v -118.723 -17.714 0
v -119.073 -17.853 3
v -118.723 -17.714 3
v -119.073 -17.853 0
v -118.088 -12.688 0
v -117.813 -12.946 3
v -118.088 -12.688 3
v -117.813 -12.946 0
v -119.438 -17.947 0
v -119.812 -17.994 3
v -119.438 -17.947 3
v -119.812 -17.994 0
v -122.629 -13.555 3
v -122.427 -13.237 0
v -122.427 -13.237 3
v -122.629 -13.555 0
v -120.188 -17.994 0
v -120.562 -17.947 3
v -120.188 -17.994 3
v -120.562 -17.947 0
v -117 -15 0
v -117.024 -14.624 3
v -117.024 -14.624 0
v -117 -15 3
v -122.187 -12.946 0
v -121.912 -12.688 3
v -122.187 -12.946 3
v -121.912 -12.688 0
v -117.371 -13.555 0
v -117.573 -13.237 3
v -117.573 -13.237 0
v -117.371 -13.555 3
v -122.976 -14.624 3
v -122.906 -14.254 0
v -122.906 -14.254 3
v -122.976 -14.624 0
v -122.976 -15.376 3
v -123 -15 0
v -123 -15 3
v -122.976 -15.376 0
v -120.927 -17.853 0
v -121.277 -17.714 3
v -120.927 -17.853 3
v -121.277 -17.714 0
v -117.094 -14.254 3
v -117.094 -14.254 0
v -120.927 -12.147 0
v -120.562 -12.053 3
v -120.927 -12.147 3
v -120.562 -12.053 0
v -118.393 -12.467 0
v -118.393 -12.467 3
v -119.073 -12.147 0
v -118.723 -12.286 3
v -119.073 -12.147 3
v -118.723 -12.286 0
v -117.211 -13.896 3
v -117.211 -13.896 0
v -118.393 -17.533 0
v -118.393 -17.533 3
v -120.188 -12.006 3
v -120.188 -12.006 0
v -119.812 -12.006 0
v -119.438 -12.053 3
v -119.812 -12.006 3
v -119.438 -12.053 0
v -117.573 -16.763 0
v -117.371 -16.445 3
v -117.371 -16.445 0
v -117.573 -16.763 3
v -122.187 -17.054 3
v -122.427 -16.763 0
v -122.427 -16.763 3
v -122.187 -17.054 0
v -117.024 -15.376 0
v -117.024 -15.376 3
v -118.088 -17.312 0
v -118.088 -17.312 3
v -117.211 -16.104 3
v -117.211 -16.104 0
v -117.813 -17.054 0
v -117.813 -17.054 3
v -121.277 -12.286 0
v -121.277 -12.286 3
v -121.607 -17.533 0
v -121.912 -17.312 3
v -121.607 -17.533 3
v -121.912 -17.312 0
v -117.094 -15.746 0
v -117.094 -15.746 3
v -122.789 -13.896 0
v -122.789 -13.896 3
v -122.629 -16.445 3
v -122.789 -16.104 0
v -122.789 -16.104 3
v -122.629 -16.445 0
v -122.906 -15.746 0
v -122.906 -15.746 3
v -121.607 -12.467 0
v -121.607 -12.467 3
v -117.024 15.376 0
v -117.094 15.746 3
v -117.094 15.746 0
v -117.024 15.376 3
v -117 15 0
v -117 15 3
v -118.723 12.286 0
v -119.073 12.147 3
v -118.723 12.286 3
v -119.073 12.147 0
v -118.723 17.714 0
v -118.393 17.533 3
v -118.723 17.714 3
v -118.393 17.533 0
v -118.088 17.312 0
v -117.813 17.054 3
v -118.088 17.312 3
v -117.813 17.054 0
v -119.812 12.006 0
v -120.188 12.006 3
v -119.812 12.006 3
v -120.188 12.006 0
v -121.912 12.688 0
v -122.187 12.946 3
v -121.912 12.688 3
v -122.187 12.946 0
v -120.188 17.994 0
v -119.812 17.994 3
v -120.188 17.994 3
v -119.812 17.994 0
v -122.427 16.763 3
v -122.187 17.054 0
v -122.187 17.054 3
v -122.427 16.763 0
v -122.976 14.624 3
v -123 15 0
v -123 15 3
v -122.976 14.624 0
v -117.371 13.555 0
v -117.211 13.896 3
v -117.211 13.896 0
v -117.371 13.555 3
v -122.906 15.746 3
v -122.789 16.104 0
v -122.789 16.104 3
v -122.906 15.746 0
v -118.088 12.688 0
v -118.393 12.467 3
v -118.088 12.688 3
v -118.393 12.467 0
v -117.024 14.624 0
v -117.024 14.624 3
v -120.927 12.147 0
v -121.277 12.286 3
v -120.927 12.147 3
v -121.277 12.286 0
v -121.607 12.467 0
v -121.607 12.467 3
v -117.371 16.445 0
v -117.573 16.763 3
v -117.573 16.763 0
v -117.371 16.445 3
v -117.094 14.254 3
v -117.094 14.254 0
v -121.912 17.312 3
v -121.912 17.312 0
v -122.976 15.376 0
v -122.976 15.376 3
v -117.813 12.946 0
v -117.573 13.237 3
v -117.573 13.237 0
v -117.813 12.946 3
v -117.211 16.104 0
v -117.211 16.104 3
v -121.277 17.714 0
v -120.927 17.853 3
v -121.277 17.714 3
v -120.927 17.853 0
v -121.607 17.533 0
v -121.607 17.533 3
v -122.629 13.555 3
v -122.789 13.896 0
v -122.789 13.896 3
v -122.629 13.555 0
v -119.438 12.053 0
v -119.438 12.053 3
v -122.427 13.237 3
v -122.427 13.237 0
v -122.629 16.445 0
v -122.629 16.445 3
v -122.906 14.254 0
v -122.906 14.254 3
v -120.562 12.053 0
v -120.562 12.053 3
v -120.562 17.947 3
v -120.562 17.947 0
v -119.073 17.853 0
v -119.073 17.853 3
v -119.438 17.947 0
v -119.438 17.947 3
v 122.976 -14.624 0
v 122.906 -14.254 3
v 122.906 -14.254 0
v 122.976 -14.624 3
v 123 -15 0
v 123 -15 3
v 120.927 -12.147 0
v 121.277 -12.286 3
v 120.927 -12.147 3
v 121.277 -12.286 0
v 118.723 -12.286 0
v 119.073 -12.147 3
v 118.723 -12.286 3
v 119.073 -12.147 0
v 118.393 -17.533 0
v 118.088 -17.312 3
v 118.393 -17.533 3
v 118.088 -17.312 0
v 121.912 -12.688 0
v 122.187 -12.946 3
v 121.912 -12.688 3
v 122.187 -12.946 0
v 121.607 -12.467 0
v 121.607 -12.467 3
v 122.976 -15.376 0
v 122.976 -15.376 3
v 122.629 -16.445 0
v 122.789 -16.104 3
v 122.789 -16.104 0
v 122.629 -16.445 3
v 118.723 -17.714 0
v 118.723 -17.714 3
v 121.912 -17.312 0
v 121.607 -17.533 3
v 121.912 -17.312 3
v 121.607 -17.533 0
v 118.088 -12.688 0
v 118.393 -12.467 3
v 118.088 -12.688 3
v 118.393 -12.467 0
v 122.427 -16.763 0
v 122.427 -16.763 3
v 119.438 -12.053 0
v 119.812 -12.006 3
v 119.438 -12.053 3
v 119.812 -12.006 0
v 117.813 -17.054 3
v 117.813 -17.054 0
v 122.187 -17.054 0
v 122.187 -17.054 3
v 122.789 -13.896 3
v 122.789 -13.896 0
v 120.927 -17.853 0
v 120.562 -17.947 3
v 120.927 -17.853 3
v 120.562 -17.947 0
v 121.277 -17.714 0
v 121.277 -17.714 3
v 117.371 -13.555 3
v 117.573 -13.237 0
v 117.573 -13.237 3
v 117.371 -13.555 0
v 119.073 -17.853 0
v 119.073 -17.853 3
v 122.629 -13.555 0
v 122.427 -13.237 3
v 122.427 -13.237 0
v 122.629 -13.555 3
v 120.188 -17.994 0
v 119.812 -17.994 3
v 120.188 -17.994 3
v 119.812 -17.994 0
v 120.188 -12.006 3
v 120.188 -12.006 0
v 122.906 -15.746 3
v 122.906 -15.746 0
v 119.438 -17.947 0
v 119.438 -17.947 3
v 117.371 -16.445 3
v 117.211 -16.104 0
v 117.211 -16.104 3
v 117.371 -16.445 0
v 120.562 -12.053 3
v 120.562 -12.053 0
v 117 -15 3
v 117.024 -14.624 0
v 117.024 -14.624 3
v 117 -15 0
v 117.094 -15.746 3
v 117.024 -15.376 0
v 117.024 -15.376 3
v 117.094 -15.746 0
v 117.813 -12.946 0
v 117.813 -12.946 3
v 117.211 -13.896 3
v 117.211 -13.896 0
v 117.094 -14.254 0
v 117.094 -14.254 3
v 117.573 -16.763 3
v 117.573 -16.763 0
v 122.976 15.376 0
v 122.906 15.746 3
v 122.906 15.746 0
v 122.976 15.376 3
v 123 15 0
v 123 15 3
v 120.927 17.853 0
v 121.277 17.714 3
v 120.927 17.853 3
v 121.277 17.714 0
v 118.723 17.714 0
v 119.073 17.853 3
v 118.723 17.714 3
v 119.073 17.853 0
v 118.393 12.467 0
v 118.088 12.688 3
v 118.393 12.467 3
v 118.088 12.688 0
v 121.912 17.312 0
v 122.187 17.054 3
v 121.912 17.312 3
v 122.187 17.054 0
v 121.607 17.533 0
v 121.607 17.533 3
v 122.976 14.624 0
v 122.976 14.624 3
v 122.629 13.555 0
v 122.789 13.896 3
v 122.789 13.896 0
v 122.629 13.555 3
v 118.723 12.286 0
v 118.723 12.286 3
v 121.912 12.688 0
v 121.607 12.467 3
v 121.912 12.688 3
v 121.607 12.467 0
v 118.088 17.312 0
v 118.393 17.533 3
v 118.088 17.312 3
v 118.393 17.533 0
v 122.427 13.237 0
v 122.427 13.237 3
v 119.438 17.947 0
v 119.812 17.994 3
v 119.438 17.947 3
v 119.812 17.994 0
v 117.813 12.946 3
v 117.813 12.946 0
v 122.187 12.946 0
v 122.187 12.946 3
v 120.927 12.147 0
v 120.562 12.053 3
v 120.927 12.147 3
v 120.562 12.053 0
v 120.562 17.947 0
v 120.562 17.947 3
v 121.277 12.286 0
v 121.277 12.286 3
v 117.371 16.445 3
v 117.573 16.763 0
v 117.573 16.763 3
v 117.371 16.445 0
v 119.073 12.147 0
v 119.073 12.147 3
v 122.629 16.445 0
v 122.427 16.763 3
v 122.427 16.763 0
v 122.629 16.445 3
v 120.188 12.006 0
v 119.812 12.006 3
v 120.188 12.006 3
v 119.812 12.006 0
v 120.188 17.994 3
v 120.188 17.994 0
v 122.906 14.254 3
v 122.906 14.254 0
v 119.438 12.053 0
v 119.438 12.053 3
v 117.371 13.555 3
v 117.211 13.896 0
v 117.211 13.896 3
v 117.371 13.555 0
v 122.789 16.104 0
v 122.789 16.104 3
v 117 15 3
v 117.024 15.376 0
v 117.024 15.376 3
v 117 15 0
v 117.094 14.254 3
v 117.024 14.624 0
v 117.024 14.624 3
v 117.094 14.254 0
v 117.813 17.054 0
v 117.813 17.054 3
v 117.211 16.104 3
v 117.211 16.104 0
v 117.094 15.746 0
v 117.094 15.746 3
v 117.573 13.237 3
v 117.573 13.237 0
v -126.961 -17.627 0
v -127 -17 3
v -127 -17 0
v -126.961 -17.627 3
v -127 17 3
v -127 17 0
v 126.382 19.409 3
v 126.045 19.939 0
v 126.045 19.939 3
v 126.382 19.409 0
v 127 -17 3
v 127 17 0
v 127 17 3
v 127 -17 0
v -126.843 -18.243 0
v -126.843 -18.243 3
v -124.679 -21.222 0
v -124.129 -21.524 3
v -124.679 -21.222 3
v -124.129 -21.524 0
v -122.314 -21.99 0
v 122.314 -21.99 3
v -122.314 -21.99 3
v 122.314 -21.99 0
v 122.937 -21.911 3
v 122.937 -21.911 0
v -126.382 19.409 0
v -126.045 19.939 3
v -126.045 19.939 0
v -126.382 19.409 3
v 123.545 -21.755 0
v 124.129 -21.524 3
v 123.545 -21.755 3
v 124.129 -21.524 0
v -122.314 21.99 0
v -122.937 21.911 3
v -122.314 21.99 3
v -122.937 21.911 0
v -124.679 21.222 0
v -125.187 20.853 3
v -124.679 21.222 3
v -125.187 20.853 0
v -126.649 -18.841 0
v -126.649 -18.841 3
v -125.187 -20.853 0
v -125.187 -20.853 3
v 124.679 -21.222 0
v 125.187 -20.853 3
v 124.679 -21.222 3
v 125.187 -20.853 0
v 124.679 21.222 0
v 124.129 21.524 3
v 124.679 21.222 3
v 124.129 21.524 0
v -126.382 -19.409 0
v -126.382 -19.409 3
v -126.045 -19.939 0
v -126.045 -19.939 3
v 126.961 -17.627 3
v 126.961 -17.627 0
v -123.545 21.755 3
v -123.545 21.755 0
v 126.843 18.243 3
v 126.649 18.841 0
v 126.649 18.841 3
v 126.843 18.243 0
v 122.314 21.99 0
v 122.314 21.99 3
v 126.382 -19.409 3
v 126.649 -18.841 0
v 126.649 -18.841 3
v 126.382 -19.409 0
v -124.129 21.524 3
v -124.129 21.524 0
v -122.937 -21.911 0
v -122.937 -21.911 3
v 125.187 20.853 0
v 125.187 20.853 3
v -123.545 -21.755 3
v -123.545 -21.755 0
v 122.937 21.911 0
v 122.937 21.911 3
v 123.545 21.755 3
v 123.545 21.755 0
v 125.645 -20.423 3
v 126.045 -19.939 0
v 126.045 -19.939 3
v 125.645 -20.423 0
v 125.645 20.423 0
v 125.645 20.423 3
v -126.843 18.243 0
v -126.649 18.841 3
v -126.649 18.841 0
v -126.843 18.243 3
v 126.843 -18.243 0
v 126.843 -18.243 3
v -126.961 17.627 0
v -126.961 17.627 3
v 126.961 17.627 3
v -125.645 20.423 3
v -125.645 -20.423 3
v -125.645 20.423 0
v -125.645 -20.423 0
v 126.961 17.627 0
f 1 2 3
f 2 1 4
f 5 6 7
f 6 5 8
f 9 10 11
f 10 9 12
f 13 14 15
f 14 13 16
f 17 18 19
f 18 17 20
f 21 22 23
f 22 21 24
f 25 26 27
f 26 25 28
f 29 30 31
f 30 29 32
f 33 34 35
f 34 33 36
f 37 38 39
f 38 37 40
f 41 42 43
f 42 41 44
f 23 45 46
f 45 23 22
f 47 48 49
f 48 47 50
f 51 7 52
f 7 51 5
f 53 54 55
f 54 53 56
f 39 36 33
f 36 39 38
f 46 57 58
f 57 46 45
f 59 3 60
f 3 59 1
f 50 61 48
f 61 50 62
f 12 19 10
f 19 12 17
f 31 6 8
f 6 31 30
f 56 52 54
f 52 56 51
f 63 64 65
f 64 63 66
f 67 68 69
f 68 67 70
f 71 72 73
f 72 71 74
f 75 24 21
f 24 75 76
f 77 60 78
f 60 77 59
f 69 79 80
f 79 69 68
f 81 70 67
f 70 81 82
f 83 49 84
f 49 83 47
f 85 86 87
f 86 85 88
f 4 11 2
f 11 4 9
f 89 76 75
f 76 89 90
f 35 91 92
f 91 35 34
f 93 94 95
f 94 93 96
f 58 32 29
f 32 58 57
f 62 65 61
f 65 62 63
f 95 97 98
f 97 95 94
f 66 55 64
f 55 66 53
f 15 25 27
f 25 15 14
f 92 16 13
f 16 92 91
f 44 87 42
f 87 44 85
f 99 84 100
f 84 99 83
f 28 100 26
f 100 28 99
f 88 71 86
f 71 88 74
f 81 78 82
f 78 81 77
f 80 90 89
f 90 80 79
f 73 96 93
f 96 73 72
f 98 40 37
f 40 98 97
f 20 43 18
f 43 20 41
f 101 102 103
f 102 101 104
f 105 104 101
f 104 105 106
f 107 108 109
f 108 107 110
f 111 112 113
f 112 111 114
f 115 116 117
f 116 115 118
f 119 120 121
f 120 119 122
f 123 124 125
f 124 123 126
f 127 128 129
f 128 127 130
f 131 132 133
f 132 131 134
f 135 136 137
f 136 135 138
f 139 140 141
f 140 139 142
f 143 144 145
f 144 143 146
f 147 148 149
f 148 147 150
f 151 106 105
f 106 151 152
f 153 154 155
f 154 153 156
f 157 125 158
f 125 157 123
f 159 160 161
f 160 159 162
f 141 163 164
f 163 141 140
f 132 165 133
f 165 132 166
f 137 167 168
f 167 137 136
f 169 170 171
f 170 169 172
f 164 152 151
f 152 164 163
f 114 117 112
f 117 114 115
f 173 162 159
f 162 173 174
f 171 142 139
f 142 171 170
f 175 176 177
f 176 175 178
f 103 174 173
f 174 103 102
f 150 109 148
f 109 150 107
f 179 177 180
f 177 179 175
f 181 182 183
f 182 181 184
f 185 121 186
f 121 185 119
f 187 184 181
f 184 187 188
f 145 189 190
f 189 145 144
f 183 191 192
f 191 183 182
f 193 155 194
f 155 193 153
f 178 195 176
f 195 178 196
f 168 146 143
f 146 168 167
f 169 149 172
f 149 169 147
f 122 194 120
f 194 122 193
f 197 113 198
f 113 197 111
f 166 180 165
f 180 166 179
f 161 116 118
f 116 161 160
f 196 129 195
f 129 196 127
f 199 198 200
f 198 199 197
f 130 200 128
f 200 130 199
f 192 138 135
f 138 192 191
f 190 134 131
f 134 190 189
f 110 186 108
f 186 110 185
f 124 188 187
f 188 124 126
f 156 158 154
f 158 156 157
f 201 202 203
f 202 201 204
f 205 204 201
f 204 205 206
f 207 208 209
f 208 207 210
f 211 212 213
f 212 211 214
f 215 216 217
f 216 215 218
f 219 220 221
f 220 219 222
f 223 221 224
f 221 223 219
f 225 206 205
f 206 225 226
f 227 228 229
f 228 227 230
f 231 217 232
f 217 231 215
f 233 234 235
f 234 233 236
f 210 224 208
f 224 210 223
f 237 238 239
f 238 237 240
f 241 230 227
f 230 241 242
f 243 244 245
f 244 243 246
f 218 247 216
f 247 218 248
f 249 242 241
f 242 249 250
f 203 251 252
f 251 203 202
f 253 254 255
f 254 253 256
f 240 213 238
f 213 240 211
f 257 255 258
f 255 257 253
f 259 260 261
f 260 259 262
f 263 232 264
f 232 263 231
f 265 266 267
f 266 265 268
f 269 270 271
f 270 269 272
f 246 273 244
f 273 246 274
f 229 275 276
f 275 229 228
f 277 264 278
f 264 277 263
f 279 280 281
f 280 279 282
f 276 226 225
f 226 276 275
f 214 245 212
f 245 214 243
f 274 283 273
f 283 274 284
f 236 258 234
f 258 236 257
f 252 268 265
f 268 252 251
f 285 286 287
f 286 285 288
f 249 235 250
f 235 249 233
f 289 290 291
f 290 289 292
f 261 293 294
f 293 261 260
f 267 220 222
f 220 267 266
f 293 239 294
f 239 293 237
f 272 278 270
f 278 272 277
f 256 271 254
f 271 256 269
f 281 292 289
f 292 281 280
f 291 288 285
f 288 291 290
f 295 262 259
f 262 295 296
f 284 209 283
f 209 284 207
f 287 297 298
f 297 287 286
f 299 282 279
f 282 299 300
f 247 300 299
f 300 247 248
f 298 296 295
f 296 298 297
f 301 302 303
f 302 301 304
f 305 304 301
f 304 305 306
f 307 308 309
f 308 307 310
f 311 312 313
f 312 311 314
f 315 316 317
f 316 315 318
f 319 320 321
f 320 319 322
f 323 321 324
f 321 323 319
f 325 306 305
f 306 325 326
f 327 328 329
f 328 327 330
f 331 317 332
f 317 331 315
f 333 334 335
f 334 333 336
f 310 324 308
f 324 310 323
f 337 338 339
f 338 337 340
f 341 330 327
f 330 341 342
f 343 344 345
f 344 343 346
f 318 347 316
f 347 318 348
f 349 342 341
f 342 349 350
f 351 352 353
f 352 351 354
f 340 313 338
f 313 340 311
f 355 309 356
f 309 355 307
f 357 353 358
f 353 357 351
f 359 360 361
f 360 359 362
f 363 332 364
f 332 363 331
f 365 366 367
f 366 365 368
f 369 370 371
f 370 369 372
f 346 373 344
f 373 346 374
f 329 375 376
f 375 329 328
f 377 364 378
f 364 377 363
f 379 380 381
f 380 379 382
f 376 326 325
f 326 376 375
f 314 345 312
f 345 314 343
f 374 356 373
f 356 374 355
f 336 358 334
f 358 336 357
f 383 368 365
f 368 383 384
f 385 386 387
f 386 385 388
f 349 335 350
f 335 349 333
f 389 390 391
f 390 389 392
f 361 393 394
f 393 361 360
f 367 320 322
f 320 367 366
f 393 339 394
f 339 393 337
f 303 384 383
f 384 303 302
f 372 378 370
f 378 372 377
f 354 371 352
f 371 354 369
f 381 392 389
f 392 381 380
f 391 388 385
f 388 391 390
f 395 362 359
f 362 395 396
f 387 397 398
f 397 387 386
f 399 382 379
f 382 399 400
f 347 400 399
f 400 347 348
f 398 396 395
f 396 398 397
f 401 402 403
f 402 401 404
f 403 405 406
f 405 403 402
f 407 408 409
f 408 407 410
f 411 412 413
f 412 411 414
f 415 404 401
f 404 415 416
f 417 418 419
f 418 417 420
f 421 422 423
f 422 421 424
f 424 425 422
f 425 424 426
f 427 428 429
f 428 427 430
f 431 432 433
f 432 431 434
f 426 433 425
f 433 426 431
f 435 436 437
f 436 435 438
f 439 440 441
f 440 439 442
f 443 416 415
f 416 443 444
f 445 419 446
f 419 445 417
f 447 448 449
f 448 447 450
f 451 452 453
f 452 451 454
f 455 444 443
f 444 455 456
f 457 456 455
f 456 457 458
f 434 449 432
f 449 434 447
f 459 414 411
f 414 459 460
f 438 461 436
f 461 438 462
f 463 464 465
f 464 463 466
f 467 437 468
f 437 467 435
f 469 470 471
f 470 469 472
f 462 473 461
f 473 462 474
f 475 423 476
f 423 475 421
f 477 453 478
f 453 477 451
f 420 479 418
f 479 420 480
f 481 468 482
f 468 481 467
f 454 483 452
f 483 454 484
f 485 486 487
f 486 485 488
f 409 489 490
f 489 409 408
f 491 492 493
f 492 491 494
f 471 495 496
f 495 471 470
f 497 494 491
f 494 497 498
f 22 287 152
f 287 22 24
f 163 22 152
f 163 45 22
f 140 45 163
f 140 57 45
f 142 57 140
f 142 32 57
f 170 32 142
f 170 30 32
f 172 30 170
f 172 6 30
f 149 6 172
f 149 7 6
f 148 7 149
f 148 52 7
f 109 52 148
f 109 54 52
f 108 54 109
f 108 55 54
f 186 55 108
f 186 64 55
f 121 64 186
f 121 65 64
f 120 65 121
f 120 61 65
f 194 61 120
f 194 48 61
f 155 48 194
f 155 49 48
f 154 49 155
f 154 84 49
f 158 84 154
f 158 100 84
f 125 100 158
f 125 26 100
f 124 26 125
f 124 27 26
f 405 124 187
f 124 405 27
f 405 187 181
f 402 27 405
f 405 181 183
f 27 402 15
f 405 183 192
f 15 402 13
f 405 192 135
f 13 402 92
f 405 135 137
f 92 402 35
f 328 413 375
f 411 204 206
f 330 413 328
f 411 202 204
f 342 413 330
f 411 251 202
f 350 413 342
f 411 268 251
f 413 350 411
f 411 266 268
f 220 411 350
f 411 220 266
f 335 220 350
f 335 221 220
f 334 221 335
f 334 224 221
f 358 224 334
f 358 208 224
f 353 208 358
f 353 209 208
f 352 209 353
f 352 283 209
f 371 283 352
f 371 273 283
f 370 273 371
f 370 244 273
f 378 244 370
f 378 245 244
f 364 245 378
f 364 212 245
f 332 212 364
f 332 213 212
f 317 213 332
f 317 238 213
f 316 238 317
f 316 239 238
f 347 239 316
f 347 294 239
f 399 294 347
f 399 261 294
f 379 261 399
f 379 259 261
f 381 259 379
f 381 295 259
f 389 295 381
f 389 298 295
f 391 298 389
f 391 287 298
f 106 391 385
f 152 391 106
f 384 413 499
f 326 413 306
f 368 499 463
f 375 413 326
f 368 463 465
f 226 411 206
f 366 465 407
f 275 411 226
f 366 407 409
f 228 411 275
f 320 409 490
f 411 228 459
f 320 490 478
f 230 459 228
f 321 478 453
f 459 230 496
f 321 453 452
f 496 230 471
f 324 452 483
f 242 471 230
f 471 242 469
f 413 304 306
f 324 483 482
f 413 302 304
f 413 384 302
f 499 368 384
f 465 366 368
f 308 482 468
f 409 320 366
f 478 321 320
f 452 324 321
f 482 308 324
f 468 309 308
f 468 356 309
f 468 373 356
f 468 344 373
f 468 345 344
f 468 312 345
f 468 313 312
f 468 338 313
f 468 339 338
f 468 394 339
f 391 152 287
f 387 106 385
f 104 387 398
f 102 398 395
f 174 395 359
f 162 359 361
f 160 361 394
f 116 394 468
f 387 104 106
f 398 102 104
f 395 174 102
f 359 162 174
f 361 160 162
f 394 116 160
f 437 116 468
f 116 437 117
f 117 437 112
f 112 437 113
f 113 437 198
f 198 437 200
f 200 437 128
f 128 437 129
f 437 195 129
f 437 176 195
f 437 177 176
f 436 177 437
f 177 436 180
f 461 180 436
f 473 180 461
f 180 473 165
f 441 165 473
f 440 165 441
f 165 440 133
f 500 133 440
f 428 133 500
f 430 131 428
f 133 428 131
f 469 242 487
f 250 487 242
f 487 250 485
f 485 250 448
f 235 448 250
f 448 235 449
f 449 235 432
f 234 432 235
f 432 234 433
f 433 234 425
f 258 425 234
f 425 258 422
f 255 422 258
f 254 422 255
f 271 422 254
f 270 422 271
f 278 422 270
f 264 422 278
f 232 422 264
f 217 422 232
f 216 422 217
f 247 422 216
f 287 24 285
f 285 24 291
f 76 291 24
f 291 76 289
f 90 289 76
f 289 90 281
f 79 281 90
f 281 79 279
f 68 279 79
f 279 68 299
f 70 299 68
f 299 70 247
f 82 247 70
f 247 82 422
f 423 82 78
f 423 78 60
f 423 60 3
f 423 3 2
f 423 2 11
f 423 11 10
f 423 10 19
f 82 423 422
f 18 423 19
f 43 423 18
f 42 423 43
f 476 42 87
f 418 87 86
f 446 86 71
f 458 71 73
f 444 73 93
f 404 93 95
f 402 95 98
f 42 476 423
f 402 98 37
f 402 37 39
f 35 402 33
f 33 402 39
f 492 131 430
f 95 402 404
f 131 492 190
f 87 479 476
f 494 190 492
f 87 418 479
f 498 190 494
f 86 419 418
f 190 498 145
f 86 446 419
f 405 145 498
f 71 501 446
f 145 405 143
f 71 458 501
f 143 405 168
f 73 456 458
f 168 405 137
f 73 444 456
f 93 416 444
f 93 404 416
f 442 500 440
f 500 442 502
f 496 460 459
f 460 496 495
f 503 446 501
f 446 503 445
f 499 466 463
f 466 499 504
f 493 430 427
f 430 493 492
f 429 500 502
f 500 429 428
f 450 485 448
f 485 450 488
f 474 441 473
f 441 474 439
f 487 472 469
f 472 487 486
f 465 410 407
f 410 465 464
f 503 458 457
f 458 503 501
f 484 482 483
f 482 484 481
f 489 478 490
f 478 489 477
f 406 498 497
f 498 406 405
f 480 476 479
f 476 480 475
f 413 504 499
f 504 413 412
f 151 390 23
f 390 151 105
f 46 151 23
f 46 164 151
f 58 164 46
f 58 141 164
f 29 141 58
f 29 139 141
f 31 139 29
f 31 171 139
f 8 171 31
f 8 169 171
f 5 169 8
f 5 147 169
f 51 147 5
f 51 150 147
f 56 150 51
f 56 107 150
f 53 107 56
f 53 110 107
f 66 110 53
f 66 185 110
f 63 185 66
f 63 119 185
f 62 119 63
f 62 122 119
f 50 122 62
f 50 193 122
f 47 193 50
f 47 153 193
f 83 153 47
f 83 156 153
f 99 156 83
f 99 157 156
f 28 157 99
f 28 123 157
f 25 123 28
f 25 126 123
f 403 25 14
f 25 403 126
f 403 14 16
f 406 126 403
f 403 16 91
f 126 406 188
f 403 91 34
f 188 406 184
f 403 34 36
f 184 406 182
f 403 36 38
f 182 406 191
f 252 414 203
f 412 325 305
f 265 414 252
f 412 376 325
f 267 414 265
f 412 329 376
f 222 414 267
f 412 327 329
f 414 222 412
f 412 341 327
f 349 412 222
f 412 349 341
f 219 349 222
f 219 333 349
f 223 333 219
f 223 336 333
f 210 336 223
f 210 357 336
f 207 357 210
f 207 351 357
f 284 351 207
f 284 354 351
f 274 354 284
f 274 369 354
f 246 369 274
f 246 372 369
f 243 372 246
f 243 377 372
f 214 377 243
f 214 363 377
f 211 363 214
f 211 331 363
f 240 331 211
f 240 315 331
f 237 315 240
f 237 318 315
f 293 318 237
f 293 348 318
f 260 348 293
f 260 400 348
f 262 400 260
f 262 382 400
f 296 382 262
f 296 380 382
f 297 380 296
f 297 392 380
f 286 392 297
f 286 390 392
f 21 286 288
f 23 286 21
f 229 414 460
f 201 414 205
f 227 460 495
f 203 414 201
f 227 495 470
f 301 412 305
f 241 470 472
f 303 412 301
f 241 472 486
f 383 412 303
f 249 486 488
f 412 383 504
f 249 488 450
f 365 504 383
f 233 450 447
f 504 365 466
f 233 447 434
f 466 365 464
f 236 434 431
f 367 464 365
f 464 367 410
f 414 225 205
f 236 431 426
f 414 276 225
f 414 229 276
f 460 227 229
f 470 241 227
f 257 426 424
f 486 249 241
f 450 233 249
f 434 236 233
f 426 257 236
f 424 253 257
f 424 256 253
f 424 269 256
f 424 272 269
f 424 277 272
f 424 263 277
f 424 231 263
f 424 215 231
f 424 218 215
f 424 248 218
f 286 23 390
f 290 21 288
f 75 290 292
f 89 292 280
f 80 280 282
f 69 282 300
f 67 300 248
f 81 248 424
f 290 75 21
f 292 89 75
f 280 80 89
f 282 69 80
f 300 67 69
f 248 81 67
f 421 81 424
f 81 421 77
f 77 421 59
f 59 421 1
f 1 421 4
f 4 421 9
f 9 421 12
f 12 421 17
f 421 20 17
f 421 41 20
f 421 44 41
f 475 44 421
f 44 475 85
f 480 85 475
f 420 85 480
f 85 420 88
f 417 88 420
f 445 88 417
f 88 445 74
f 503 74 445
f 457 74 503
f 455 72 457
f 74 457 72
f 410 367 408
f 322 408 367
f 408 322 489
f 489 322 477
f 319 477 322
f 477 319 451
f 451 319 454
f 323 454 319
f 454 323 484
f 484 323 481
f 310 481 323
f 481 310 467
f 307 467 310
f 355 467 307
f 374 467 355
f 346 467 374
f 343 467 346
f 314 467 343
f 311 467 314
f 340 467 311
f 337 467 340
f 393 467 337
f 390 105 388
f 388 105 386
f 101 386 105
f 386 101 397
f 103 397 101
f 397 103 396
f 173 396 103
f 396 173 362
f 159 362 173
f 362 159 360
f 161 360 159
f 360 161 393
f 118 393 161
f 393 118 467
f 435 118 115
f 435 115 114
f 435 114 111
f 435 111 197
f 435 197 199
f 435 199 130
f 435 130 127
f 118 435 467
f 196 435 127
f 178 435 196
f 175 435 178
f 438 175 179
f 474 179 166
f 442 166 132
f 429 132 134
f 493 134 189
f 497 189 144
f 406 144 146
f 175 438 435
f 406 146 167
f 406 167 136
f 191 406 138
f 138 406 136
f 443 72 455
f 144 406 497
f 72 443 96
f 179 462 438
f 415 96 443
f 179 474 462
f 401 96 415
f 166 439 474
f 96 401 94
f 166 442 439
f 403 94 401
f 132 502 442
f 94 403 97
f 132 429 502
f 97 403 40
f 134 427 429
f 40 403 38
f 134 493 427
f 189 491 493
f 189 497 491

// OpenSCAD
$fn = 50;


difference() {
	union() {
		hull() {
			translate(v = [-122.0000000000, 17.0000000000, 0]) {
				cylinder(h = 3, r = 5);
			}
			translate(v = [122.0000000000, 17.0000000000, 0]) {
				cylinder(h = 3, r = 5);
			}
			translate(v = [-122.0000000000, -17.0000000000, 0]) {
				cylinder(h = 3, r = 5);
			}
			translate(v = [122.0000000000, -17.0000000000, 0]) {
				cylinder(h = 3, r = 5);
			}
		}
	}
	union() {
		translate(v = [-120.0000000000, -15.0000000000, -100.0000000000]) {
			cylinder(h = 200, r = 3.0000000000);
		}
		translate(v = [-120.0000000000, 15.0000000000, -100.0000000000]) {
			cylinder(h = 200, r = 3.0000000000);
		}
		translate(v = [120.0000000000, -15.0000000000, -100.0000000000]) {
			cylinder(h = 200, r = 3.0000000000);
		}
		translate(v = [120.0000000000, 15.0000000000, -100.0000000000]) {
			cylinder(h = 200, r = 3.0000000000);
		}
	}
}
